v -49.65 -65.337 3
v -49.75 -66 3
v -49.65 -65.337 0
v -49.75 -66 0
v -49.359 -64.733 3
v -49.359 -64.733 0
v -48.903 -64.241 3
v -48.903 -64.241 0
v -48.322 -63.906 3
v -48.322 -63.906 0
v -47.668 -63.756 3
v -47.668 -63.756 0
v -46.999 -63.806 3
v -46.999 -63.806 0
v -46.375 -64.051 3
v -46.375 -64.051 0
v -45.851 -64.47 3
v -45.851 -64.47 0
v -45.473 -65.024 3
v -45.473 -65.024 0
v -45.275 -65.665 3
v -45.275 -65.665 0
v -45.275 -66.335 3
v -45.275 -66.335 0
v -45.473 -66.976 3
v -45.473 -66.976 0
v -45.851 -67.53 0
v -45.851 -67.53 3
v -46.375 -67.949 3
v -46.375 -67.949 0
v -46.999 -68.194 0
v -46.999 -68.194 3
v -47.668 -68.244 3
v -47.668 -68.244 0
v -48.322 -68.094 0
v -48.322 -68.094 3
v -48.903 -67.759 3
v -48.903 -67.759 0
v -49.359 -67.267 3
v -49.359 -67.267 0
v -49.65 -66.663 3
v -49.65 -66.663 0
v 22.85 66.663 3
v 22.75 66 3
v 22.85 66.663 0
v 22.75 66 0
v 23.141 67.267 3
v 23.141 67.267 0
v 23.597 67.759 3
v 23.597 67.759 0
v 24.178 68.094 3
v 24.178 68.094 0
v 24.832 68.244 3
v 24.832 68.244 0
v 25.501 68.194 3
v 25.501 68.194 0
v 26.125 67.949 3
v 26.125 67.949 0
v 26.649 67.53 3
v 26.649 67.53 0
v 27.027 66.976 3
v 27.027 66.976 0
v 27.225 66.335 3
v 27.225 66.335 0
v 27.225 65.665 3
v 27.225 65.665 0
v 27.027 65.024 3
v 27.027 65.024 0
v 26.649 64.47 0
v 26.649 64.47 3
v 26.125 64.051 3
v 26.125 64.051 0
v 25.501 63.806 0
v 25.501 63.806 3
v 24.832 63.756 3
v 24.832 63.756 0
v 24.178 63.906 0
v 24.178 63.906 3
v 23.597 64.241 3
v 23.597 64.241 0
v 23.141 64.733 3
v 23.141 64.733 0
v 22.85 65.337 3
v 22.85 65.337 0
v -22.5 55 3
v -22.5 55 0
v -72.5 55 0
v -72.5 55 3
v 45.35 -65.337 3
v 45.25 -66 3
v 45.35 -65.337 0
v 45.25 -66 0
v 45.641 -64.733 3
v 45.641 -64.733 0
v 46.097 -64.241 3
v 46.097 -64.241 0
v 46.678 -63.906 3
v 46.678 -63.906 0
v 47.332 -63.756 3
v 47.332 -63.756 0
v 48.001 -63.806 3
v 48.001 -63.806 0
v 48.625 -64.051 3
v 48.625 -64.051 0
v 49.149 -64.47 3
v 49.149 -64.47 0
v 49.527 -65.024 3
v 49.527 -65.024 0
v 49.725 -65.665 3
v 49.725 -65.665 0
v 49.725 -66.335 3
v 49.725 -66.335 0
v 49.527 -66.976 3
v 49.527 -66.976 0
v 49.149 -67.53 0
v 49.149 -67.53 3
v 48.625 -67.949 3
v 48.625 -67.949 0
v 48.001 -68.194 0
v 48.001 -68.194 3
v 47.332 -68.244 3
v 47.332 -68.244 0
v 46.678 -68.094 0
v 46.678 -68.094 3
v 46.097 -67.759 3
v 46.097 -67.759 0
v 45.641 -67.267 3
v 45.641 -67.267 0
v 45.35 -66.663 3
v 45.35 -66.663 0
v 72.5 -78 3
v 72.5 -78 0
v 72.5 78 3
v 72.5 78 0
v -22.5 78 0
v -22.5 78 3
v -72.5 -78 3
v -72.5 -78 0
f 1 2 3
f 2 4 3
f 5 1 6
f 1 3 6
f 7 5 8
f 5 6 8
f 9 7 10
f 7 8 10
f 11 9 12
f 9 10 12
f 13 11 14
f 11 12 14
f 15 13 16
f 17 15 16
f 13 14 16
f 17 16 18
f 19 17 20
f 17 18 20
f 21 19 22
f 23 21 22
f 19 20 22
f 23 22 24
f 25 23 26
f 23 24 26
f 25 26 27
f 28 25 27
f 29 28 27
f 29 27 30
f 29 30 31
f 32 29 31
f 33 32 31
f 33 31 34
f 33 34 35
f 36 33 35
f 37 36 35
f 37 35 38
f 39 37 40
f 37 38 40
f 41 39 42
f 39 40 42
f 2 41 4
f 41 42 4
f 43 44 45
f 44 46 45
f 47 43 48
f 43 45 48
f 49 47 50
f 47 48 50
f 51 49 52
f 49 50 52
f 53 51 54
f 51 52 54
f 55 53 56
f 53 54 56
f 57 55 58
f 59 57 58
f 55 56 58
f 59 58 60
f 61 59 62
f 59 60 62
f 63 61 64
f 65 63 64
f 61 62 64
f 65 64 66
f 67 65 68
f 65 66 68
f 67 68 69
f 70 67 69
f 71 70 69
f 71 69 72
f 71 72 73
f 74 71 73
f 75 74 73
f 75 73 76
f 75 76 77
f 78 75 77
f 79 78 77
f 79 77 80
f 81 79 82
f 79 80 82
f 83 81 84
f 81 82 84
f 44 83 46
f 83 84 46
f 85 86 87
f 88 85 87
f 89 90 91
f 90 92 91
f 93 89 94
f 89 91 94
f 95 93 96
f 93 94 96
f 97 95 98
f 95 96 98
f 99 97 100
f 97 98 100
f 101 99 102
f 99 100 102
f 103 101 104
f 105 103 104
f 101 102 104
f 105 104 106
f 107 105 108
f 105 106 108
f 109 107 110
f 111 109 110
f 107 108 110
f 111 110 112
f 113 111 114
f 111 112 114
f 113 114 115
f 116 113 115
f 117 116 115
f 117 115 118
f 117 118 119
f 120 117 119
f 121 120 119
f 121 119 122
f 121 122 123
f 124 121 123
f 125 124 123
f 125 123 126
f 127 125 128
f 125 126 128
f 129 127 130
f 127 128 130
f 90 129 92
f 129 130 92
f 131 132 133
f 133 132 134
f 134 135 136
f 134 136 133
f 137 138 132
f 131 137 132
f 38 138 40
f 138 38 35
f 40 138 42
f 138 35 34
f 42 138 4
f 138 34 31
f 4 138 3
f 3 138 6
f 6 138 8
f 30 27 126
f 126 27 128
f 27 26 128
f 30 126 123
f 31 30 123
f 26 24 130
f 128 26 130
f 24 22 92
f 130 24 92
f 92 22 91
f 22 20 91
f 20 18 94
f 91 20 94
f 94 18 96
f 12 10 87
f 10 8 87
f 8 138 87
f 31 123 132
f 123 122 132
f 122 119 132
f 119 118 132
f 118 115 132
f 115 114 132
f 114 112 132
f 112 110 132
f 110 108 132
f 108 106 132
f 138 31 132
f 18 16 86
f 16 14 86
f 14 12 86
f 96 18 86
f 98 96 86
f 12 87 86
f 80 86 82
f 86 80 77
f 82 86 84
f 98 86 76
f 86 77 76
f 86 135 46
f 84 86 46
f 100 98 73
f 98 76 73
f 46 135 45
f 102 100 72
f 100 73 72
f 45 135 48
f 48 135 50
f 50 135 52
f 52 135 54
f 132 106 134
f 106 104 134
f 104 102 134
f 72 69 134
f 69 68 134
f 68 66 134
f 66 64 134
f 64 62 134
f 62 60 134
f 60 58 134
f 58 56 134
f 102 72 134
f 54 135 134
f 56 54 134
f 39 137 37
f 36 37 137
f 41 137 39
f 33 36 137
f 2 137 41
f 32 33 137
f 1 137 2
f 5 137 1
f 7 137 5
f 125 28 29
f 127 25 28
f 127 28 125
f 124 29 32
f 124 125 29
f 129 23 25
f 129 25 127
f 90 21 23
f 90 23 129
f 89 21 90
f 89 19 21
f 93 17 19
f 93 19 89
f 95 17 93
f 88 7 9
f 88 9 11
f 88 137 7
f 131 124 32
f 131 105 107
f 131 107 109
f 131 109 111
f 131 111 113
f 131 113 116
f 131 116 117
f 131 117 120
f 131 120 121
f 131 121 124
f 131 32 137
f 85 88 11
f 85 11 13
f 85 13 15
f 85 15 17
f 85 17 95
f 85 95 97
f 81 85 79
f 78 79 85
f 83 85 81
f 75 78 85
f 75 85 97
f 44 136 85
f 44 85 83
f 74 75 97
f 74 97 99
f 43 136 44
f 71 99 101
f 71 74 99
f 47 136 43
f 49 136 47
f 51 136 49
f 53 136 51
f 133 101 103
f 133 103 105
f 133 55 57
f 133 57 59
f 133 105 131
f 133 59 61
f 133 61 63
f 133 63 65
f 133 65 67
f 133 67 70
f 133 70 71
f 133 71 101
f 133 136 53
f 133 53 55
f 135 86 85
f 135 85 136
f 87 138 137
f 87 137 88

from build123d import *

# Parameters (mm, degrees)
SKIZZE1_W                       = 145
SKIZZE1_H                       = 156
AUFSATZ_LINEAR_AUSTRAGEN1_DEPTH = 3
DURCHGANGSLOCH_F_R_M41_D        = 4.5
DURCHGANGSLOCH_F_R_M41_DEPTH    = 3
DURCHGANGSLOCH_F_R_M41_TIP      = 1.351936393
SKIZZE5_W                       = 50
SKIZZE5_H                       = 23
SCHNITT_LINEAR_AUSTRAGEN1_DEPTH = 107.532858781


with BuildPart() as part:
    # Skizze1 → Aufsatz-Linear austragen1 (new body)
    with BuildSketch(Plane.XY):
        Rectangle(SKIZZE1_W, SKIZZE1_H)
    extrude(amount=AUFSATZ_LINEAR_AUSTRAGEN1_DEPTH)

    # Durchgangsloch für M41
    with Locations(Plane.XY.offset(3)):
        with Locations((25, 66), (-47.5, -66), (47.5, -66)):
            Hole(DURCHGANGSLOCH_F_R_M41_D / 2, depth=DURCHGANGSLOCH_F_R_M41_DEPTH)
            with Locations((0, 0, -(DURCHGANGSLOCH_F_R_M41_DEPTH + DURCHGANGSLOCH_F_R_M41_TIP / 2))):  # 118° drill point
                Cone(0, DURCHGANGSLOCH_F_R_M41_D / 2, DURCHGANGSLOCH_F_R_M41_TIP, mode=Mode.SUBTRACT)

    # Skizze5 → Schnitt-Linear austragen1 (cut, through all)
    with BuildSketch(Plane(origin=(0, 0, 0), x_dir=(-1, 0, 0), z_dir=(0, 0, -1))):
        with Locations((47.5, 66.5)):
            Rectangle(SKIZZE5_W, SKIZZE5_H)
    extrude(amount=-SCHNITT_LINEAR_AUSTRAGEN1_DEPTH, mode=Mode.SUBTRACT)


solid = part.part
